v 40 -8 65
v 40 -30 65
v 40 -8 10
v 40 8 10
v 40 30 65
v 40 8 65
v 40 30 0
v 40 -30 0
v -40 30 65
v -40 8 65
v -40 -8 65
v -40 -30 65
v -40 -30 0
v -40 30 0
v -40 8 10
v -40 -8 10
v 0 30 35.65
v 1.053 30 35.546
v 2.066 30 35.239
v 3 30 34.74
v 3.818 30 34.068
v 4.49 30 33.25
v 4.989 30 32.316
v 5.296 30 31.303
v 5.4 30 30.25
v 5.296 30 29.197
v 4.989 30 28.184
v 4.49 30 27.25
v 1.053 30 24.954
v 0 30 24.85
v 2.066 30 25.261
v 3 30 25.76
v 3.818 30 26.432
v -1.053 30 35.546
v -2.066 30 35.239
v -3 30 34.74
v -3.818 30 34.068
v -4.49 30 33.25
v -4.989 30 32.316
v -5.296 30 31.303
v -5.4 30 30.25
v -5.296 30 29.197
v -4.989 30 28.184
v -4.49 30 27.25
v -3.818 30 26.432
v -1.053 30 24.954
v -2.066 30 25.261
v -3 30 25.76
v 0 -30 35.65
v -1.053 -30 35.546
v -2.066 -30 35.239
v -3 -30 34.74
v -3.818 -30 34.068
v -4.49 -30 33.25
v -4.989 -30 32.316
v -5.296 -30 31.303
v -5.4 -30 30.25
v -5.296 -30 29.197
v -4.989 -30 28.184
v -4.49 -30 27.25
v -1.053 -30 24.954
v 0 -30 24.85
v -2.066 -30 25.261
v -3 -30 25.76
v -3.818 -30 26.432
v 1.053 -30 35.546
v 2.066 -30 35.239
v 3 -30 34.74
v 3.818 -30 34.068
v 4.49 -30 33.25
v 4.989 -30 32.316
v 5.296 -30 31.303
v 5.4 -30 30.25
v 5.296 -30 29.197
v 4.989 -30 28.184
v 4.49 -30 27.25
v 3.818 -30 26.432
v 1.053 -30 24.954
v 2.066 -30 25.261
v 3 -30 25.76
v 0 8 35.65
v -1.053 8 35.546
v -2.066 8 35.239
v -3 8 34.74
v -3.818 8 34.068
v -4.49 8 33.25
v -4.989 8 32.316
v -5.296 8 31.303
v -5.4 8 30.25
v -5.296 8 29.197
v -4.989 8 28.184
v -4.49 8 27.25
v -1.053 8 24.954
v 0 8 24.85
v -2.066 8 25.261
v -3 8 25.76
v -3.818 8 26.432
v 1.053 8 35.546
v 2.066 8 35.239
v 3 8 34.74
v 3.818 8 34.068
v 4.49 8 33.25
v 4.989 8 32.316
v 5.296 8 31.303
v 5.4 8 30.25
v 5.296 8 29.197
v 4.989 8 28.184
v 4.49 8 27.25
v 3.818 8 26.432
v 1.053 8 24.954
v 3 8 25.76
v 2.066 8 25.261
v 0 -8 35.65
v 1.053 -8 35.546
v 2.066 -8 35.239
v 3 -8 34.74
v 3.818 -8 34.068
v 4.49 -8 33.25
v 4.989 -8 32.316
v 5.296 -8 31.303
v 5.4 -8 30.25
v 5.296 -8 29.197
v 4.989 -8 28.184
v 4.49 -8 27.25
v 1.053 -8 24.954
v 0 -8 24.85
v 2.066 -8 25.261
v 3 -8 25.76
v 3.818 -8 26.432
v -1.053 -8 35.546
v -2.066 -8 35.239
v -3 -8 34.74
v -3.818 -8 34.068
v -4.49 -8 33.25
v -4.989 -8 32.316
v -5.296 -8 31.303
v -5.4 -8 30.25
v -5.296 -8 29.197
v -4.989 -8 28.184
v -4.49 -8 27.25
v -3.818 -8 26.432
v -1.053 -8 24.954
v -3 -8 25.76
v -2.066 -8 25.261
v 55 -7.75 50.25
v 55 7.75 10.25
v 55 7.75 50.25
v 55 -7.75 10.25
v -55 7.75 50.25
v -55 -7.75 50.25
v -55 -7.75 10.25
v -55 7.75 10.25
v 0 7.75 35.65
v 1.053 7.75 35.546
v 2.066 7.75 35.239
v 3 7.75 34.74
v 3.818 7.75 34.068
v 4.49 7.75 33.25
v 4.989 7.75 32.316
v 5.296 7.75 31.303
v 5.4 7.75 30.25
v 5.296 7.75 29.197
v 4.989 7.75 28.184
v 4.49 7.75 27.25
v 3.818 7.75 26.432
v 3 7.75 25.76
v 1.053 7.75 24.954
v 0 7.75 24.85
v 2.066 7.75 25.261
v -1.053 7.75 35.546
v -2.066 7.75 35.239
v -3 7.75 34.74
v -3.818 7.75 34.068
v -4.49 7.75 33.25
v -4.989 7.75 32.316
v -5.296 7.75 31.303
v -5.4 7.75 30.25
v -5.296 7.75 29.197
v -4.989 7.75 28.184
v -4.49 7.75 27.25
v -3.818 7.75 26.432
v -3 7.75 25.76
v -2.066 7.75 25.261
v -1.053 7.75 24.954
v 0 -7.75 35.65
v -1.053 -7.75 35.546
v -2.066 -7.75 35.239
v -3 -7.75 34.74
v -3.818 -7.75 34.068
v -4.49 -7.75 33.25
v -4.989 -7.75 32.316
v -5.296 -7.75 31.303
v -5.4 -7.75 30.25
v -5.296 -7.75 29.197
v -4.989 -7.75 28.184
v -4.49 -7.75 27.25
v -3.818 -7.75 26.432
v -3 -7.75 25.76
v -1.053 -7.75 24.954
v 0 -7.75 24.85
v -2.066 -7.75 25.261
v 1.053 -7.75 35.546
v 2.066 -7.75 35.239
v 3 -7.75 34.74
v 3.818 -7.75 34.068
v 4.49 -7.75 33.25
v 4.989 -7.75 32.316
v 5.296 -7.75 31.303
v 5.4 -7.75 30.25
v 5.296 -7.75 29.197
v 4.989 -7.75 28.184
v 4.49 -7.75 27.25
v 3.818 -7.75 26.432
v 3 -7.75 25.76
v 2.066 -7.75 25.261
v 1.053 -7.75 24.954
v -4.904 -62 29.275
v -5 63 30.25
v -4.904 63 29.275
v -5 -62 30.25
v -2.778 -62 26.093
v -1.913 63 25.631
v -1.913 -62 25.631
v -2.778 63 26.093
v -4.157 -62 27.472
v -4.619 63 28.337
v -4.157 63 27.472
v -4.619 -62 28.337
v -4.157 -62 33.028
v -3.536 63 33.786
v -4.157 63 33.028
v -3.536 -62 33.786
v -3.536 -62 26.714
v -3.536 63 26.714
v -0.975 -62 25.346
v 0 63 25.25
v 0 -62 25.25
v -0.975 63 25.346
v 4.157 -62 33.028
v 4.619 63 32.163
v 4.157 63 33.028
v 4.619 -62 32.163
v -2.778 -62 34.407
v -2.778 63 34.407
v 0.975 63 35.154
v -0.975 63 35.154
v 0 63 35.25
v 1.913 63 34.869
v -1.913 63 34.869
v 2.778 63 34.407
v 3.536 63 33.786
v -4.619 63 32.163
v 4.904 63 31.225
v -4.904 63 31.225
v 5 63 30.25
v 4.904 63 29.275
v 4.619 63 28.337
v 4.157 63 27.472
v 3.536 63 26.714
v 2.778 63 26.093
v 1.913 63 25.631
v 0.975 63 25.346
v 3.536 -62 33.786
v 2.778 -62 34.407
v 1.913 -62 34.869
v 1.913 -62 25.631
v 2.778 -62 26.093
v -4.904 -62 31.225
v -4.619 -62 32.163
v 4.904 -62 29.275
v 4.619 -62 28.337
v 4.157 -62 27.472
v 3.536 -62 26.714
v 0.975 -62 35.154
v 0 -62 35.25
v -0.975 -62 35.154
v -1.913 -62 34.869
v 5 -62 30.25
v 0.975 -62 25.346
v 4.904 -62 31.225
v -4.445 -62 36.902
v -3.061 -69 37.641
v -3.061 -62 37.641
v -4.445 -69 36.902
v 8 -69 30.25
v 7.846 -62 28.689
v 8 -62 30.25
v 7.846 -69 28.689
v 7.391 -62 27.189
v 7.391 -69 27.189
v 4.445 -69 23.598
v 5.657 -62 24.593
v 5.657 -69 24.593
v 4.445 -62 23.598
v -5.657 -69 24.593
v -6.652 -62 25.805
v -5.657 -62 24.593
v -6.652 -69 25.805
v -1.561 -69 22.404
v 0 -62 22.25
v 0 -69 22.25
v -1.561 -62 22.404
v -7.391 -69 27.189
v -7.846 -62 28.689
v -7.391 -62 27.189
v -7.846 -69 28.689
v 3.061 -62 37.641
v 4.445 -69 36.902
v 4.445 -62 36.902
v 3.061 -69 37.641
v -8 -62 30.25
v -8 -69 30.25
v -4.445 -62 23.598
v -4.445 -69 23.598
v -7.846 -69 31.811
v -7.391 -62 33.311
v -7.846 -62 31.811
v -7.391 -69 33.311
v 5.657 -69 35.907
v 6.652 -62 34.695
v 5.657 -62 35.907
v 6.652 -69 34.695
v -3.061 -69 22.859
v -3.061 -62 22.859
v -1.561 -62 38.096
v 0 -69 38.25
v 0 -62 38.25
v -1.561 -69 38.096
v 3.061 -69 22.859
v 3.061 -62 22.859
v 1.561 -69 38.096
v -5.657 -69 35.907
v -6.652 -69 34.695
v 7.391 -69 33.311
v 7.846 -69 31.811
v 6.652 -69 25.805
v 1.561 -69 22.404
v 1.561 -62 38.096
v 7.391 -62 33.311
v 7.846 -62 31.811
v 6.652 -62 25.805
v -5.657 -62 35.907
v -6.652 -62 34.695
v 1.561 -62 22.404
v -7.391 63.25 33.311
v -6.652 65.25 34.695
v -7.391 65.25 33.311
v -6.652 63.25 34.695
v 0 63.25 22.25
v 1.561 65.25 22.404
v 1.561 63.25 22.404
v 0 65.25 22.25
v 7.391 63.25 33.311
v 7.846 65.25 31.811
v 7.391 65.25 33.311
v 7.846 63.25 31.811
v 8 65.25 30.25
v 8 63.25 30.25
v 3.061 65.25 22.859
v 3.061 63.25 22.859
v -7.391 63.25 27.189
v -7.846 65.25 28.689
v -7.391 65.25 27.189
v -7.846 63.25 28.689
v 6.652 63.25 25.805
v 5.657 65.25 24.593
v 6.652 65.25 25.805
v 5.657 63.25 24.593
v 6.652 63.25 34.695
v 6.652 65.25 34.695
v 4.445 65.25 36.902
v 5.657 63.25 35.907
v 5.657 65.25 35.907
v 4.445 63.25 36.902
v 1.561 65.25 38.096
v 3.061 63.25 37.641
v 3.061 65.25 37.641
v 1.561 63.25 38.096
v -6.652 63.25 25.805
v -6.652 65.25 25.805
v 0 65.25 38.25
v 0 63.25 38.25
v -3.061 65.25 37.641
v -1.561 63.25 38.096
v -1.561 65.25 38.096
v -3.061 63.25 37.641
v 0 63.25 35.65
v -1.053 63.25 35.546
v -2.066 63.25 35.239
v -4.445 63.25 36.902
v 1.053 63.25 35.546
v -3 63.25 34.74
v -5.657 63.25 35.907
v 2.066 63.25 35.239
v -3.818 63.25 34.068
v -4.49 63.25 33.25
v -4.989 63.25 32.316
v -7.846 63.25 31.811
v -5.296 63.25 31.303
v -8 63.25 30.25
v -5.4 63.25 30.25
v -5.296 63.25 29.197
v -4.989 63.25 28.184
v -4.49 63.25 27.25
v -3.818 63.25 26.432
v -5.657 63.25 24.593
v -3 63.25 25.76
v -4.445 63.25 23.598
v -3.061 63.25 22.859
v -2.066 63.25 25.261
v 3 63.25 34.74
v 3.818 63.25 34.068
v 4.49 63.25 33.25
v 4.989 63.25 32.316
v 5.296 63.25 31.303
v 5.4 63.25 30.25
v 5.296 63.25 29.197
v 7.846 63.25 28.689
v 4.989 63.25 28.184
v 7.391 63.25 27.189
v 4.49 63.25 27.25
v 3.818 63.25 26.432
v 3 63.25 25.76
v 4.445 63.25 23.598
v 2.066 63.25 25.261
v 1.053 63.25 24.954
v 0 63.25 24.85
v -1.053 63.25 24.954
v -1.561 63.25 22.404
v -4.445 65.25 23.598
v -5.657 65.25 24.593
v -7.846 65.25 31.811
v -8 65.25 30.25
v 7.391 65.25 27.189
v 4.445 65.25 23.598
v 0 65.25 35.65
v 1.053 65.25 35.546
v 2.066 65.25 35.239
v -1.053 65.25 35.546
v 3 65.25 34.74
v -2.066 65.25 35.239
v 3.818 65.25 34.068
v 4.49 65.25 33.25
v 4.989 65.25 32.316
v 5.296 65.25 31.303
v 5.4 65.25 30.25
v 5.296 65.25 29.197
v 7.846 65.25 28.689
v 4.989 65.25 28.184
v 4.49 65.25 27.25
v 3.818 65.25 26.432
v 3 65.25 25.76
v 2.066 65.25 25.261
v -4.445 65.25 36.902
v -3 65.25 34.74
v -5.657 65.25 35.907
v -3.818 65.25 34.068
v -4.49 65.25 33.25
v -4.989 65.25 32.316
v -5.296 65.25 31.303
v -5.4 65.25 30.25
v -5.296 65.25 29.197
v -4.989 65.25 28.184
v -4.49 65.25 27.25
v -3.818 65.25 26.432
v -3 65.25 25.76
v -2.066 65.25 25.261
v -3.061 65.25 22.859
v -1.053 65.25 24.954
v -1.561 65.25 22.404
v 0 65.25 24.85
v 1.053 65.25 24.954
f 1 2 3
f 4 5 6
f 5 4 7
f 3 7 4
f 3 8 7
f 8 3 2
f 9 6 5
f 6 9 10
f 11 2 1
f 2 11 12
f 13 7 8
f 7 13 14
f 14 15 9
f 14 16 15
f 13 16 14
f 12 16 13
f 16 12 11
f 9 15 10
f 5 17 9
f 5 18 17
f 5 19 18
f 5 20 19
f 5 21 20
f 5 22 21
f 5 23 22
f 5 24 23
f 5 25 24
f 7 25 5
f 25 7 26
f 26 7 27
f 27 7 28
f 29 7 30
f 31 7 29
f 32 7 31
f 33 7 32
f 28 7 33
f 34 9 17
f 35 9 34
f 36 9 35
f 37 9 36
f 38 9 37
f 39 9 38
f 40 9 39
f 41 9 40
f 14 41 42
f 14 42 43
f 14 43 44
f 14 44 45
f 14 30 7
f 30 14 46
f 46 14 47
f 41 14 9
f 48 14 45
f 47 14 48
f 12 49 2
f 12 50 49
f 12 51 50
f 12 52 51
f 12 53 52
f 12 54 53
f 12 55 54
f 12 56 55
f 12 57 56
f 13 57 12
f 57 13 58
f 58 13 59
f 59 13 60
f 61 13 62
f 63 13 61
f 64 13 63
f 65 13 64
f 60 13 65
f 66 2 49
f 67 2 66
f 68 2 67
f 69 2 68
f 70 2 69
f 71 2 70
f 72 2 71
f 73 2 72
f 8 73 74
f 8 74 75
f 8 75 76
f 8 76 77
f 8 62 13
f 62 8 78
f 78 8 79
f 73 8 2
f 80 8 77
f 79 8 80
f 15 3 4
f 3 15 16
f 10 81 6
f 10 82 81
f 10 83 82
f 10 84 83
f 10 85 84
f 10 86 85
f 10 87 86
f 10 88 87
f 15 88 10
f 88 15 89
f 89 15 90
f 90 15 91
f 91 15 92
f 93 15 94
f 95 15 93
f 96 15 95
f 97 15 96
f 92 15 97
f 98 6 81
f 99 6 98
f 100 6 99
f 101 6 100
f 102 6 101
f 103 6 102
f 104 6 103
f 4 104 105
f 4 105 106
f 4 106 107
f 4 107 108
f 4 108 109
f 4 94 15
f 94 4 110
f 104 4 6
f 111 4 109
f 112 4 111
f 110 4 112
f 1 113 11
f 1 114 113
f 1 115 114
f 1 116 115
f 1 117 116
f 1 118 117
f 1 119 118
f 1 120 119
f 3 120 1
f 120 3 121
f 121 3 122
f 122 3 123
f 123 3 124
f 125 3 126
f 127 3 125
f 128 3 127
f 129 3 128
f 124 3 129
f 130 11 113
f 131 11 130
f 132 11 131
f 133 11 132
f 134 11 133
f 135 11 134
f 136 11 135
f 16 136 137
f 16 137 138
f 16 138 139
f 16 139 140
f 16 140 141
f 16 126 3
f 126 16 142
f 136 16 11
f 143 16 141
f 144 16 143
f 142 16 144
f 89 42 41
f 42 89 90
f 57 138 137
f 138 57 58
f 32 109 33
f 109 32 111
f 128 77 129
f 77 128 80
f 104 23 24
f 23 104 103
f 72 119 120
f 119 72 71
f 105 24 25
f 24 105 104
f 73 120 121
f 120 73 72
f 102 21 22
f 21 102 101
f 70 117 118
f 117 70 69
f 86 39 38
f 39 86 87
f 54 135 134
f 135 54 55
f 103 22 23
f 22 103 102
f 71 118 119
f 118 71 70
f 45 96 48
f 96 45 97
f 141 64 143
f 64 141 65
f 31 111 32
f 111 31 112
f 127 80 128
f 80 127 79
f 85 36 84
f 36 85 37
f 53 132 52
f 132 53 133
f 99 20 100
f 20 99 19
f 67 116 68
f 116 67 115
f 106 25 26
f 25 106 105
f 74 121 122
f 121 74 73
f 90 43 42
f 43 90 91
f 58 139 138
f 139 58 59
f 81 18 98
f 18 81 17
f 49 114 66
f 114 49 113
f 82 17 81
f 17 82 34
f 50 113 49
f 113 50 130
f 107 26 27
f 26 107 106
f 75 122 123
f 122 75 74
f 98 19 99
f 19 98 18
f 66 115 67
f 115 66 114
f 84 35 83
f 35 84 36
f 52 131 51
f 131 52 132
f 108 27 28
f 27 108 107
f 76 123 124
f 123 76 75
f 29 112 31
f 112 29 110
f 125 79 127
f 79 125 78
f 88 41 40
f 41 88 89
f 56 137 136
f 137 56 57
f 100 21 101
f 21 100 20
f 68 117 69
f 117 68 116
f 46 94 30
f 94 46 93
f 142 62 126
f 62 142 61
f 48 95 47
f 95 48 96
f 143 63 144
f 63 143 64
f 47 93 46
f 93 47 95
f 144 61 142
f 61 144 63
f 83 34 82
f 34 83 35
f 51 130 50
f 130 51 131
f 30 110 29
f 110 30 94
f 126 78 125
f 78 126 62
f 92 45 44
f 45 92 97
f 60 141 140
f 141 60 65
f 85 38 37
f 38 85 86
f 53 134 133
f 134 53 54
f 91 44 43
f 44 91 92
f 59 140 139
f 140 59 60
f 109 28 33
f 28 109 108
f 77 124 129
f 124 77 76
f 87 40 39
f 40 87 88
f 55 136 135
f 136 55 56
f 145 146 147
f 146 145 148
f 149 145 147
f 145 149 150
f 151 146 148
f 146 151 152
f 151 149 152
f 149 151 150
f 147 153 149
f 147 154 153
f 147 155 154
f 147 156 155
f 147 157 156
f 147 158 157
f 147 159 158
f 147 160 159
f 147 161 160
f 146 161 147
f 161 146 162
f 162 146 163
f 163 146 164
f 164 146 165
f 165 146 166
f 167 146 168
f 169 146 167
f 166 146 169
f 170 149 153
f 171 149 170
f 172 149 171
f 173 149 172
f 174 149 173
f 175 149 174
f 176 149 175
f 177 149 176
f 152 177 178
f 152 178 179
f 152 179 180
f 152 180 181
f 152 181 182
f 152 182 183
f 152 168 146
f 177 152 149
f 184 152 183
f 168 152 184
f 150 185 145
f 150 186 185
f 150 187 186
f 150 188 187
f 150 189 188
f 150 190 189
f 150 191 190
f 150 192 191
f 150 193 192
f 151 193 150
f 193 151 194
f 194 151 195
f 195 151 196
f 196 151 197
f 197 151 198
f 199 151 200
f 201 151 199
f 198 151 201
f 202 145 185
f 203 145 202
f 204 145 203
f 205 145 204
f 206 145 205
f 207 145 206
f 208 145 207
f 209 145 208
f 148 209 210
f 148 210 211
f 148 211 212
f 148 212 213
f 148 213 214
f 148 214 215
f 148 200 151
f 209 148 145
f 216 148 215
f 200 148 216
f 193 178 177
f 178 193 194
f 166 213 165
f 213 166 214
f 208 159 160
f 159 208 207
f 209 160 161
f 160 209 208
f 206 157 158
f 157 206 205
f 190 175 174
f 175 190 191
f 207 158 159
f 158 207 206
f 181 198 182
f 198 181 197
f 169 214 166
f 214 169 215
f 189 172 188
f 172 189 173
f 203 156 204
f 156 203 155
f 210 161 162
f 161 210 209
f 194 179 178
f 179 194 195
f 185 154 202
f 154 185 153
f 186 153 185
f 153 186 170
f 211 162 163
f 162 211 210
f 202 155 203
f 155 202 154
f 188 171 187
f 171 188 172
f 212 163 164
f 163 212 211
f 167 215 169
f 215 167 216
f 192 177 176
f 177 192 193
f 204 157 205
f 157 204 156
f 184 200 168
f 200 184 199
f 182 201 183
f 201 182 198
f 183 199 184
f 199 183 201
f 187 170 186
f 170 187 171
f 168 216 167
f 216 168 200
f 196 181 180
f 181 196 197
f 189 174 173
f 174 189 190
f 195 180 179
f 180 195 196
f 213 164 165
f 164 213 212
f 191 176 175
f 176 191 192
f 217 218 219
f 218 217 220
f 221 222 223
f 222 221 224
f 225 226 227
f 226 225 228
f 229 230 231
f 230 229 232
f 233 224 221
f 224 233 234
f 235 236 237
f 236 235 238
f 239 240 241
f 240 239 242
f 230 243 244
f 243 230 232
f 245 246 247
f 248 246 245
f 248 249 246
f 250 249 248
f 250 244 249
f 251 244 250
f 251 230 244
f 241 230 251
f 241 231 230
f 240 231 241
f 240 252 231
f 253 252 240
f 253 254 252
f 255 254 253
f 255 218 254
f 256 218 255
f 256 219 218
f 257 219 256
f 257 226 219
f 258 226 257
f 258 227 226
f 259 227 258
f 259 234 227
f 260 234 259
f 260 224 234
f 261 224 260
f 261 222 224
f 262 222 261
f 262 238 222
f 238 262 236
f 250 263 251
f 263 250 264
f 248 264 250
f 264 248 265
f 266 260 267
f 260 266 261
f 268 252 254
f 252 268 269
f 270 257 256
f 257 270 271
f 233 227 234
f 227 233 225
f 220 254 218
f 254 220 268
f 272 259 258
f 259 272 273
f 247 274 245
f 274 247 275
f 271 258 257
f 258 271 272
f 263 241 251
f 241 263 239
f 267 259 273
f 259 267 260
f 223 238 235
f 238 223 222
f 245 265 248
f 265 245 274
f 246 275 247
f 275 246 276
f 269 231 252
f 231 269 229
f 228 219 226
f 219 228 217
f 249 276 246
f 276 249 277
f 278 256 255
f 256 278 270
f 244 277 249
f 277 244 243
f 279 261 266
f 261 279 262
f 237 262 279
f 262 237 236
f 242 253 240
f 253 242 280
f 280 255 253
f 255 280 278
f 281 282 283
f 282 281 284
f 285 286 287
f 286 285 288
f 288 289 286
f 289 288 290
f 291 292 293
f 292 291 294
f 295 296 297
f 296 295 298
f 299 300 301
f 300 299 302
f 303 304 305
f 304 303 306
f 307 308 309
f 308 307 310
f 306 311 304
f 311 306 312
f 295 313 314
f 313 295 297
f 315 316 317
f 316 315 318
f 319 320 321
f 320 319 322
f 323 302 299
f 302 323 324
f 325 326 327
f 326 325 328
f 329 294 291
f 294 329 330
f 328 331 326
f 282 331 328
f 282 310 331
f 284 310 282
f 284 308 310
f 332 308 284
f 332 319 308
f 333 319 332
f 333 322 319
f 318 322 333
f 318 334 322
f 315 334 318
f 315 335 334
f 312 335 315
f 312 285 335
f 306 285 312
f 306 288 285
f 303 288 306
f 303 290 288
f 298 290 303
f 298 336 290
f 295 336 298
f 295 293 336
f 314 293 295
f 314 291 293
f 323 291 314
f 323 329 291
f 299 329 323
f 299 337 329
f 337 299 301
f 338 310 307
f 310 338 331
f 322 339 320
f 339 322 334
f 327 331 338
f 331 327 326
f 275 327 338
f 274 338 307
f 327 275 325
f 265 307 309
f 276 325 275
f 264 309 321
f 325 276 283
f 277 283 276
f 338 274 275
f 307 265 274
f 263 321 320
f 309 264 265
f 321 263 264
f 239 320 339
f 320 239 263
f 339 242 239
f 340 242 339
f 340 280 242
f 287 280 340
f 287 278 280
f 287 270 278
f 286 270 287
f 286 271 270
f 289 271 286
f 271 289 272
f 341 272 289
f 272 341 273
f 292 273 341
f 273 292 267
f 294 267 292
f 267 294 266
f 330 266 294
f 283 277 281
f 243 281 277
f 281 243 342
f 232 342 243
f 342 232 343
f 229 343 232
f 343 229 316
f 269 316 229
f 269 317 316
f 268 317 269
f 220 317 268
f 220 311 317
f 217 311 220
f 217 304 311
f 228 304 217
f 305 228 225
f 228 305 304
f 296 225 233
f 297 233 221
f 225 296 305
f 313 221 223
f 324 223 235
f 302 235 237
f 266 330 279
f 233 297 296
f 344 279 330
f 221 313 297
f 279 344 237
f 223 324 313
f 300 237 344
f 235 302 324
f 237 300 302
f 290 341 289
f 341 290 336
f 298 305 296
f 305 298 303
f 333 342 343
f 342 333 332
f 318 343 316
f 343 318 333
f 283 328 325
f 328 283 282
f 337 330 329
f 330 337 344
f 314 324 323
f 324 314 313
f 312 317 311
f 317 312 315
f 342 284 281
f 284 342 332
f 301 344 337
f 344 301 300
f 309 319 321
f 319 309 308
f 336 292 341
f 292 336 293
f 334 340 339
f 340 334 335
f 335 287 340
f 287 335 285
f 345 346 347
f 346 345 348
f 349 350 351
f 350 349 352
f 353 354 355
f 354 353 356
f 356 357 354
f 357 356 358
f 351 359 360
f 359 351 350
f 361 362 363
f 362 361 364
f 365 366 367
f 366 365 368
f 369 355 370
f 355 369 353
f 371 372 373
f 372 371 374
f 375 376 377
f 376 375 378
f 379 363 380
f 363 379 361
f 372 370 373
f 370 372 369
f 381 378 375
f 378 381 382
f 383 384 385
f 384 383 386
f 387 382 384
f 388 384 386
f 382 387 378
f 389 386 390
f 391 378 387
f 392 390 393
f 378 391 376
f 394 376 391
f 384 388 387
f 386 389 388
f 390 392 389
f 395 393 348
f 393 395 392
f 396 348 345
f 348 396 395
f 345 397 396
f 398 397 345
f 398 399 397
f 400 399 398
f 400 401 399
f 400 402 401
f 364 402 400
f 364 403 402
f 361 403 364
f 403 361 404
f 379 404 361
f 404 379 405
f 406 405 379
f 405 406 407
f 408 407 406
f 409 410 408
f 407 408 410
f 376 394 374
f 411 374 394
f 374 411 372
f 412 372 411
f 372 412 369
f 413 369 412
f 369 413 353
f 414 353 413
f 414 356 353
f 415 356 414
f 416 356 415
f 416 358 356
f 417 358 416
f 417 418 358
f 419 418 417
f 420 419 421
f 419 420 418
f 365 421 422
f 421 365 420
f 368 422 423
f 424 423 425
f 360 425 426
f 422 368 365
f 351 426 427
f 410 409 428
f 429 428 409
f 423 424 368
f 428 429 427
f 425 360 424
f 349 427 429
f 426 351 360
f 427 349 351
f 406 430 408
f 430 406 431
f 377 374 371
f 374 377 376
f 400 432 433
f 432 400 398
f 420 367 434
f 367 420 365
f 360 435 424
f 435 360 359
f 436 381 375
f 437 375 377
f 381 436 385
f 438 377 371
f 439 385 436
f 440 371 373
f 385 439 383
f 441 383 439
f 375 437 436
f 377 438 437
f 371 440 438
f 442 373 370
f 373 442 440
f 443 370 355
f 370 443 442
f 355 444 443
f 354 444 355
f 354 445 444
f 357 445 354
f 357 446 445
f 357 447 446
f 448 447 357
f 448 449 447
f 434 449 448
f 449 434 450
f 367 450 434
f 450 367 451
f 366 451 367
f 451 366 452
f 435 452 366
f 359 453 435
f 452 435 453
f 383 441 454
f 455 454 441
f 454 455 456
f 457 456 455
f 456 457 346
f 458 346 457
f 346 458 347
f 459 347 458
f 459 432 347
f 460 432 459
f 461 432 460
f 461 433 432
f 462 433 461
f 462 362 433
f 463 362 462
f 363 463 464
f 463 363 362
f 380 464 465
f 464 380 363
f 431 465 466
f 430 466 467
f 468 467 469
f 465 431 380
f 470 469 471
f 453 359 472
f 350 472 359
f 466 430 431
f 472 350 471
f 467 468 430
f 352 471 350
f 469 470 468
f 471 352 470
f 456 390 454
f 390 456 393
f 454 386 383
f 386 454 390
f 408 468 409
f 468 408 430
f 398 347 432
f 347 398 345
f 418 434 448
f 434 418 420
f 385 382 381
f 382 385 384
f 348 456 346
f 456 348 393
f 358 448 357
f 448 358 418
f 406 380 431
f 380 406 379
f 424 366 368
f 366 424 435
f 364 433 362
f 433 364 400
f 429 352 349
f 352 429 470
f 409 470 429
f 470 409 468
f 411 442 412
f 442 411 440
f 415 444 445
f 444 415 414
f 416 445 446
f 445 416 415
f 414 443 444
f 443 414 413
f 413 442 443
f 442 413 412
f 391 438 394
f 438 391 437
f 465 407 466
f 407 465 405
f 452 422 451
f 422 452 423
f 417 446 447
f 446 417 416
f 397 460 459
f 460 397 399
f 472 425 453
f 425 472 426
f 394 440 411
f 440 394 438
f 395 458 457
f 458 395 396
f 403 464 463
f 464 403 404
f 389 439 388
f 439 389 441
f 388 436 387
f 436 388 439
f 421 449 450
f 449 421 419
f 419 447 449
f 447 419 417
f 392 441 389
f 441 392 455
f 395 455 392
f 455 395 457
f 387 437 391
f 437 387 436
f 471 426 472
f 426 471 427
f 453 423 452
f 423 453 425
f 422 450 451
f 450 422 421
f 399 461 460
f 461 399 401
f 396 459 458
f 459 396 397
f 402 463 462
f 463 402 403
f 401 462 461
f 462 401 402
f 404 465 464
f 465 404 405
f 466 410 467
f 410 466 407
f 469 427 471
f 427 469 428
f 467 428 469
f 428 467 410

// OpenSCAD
$fn = 32;

// ------------------------------------------------------------------------
// Clevis joint: 80 mm clevis, pin d10
// Every part is its own module, assembly() places them once.
// ------------------------------------------------------------------------

// --- part 1 ---
module clevis() {
  difference() {
    translate([-40, -30, 0]) cube([80, 60, 65]);
    translate([-41, -8, 10]) cube([82, 16, 56]);
    translate([0, 0, 30.25]) rotate([90, 0, 0]) cylinder(h = 62, d = 10.8, center = true);
  }
}

// --- part 2 ---
module eye() {
  difference() {
    translate([-55, -7.75, 0]) cube([110, 15.5, 40]);
    translate([0, 0, 20]) rotate([90, 0, 0]) cylinder(h = 17.5, d = 10.8, center = true);
  }
}

// --- part 3 ---
module pin() {
  rotate([0, 90, 0]) cylinder(h = 126, d = 10, center = true);
  translate([-69, 0, 0]) rotate([0, 90, 0]) cylinder(h = 7, d = 16);
}

// --- part 4 ---
module retainer() {
  difference() {
      translate([0, 0, 0]) cylinder(h = 2, d = 16);
      translate([0, 0, -1]) cylinder(h = 4, d = 10.8);
    }
}

// --- assembly ---
module assembly() {
  translate([0, 0, 0]) rotate([0, 0, 0]) clevis();
  translate([0, 0, 10.25]) rotate([0, 0, 0]) eye();
  translate([0, 0, 30.25]) rotate([0, 0, 90]) pin();
  translate([0, 65.25, 30.25]) rotate([90, 0, 0]) retainer();
}

assembly();
